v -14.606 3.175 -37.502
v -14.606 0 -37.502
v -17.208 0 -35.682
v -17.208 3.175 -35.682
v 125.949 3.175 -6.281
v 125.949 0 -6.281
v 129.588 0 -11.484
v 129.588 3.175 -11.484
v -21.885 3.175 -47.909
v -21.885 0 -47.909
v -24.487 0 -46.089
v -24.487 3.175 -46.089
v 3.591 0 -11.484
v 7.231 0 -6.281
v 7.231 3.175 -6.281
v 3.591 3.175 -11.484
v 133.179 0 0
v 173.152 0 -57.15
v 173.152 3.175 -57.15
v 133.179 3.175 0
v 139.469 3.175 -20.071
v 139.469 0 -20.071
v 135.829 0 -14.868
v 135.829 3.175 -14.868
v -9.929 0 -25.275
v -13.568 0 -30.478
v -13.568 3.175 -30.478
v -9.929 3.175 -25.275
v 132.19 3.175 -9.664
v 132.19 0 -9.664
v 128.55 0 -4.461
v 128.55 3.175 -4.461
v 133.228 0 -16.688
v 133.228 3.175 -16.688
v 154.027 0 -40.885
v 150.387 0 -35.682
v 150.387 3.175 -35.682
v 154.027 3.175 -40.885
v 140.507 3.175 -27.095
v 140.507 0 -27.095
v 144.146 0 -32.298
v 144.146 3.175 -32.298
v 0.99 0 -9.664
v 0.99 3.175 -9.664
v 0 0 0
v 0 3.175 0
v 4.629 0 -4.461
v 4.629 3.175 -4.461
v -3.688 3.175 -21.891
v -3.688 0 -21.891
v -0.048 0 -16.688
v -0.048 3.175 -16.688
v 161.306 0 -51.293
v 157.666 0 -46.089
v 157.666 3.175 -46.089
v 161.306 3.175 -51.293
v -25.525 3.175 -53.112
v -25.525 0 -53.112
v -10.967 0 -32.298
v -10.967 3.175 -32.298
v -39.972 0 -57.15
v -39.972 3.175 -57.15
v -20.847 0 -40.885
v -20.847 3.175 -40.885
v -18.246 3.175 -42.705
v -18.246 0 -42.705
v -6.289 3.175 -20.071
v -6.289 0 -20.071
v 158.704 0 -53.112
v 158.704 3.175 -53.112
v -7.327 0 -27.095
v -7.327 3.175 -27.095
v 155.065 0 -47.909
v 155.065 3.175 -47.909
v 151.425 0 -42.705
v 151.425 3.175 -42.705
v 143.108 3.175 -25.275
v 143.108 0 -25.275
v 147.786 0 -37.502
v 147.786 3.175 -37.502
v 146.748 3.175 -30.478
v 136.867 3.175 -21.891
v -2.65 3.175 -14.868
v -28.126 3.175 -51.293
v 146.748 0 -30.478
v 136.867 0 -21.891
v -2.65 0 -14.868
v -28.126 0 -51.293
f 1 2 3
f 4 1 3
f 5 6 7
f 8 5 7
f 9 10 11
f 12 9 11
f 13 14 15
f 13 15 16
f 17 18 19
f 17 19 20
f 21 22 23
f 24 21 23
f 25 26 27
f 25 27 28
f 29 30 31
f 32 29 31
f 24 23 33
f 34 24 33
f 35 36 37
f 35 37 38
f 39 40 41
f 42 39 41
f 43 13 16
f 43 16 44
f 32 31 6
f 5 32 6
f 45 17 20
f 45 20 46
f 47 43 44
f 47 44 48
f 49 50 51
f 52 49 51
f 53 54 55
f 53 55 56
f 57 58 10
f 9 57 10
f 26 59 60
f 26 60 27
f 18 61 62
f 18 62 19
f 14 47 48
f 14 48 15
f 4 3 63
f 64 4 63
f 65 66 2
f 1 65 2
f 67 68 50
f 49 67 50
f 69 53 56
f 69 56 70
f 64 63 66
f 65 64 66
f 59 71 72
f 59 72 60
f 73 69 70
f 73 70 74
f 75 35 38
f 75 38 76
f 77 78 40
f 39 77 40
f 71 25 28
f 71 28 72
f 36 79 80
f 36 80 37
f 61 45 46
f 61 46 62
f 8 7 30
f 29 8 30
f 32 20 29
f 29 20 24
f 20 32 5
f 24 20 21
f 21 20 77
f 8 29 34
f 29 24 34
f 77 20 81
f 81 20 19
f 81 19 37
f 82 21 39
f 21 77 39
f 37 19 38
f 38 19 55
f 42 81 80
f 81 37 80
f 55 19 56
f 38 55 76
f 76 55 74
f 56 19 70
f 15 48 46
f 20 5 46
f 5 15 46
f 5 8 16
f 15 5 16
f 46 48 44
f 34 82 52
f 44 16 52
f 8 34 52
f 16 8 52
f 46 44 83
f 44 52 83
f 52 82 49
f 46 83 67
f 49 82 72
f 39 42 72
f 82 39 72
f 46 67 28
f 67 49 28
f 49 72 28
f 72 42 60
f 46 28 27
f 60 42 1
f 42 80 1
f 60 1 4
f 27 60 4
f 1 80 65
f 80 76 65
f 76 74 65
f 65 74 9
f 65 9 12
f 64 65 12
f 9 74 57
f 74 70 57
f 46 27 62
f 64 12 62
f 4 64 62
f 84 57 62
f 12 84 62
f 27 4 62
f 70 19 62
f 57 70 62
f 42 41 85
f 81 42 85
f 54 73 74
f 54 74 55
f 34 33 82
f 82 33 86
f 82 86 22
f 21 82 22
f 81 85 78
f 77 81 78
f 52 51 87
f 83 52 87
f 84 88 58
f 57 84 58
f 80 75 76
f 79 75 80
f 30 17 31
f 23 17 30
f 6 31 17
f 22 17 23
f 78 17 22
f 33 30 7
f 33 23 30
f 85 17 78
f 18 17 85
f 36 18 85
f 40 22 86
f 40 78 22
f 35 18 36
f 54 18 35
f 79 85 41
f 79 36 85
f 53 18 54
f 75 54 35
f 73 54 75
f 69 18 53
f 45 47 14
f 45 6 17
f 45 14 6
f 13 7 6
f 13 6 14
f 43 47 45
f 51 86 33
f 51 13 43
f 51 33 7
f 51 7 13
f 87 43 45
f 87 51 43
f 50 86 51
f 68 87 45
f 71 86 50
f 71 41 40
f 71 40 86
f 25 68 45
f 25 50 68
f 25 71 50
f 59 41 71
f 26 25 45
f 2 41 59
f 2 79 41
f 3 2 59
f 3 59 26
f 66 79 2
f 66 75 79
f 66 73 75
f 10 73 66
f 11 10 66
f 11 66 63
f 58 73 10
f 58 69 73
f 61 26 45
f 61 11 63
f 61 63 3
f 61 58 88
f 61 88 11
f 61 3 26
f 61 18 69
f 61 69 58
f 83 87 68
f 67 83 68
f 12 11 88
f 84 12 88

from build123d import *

# Parameters (mm, degrees)
BOSS_EXTRUDE1_DEPTH = 3.175


with BuildPart() as part:
    # Sketch1 → Boss-Extrude1 (new body)
    with BuildSketch(Plane(origin=(0, 0, 0), x_dir=(1, 0, 0), z_dir=(0, 1, 0))):
        Polygon((-39.972456053, 57.15), (173.151878886, 57.15), (133.179422833, 0), (0, 0), align=None)
        Polygon((-18.245720617, 42.70524807), (-14.606223674, 37.50173368), (-17.207980869, 35.681985209), (-20.847477812, 40.885499598), align=None, mode=Mode.SUBTRACT)
        Polygon((-10.966726732, 32.29821929), (-13.568483927, 30.478470819), (-9.928986984, 25.274956429), (-7.327229789, 27.0947049), align=None, mode=Mode.SUBTRACT)
        Polygon((-0.048235904, 16.687676121), (-2.649993099, 14.867927649), (-6.289490041, 20.071442039), (-3.687732847, 21.89119051), align=None, mode=Mode.SUBTRACT)
        Polygon((3.591261039, 11.484161731), (0.989503844, 9.66441326), (4.629000786, 4.46089887), (7.230757981, 6.280647341), align=None, mode=Mode.SUBTRACT)
        Polygon((155.064640392, 47.908762459), (157.666397587, 46.089013988), (161.30589453, 51.292528378), (158.704137335, 53.112276849), align=None, mode=Mode.SUBTRACT)
        Polygon((125.948664851, 6.280647341), (129.588161794, 11.484161731), (132.189918989, 9.66441326), (128.550422046, 4.46089887), align=None, mode=Mode.SUBTRACT)
        Polygon((139.468912874, 20.071442039), (135.829415932, 14.867927649), (133.227658737, 16.687676121), (136.867155679, 21.89119051), align=None, mode=Mode.SUBTRACT)
        Polygon((140.506652622, 27.0947049), (144.146149564, 32.29821929), (146.747906759, 30.478470819), (143.108409817, 25.274956429), align=None, mode=Mode.SUBTRACT)
        Polygon((-25.524714502, 53.112276849), (-21.88521756, 47.908762459), (-24.486974754, 46.089013988), (-28.126471697, 51.292528378), align=None, mode=Mode.SUBTRACT)
        Polygon((147.785646507, 37.50173368), (150.387403702, 35.681985209), (154.026900645, 40.885499598), (151.42514345, 42.70524807), align=None, mode=Mode.SUBTRACT)
    extrude(amount=BOSS_EXTRUDE1_DEPTH)


solid = part.part
